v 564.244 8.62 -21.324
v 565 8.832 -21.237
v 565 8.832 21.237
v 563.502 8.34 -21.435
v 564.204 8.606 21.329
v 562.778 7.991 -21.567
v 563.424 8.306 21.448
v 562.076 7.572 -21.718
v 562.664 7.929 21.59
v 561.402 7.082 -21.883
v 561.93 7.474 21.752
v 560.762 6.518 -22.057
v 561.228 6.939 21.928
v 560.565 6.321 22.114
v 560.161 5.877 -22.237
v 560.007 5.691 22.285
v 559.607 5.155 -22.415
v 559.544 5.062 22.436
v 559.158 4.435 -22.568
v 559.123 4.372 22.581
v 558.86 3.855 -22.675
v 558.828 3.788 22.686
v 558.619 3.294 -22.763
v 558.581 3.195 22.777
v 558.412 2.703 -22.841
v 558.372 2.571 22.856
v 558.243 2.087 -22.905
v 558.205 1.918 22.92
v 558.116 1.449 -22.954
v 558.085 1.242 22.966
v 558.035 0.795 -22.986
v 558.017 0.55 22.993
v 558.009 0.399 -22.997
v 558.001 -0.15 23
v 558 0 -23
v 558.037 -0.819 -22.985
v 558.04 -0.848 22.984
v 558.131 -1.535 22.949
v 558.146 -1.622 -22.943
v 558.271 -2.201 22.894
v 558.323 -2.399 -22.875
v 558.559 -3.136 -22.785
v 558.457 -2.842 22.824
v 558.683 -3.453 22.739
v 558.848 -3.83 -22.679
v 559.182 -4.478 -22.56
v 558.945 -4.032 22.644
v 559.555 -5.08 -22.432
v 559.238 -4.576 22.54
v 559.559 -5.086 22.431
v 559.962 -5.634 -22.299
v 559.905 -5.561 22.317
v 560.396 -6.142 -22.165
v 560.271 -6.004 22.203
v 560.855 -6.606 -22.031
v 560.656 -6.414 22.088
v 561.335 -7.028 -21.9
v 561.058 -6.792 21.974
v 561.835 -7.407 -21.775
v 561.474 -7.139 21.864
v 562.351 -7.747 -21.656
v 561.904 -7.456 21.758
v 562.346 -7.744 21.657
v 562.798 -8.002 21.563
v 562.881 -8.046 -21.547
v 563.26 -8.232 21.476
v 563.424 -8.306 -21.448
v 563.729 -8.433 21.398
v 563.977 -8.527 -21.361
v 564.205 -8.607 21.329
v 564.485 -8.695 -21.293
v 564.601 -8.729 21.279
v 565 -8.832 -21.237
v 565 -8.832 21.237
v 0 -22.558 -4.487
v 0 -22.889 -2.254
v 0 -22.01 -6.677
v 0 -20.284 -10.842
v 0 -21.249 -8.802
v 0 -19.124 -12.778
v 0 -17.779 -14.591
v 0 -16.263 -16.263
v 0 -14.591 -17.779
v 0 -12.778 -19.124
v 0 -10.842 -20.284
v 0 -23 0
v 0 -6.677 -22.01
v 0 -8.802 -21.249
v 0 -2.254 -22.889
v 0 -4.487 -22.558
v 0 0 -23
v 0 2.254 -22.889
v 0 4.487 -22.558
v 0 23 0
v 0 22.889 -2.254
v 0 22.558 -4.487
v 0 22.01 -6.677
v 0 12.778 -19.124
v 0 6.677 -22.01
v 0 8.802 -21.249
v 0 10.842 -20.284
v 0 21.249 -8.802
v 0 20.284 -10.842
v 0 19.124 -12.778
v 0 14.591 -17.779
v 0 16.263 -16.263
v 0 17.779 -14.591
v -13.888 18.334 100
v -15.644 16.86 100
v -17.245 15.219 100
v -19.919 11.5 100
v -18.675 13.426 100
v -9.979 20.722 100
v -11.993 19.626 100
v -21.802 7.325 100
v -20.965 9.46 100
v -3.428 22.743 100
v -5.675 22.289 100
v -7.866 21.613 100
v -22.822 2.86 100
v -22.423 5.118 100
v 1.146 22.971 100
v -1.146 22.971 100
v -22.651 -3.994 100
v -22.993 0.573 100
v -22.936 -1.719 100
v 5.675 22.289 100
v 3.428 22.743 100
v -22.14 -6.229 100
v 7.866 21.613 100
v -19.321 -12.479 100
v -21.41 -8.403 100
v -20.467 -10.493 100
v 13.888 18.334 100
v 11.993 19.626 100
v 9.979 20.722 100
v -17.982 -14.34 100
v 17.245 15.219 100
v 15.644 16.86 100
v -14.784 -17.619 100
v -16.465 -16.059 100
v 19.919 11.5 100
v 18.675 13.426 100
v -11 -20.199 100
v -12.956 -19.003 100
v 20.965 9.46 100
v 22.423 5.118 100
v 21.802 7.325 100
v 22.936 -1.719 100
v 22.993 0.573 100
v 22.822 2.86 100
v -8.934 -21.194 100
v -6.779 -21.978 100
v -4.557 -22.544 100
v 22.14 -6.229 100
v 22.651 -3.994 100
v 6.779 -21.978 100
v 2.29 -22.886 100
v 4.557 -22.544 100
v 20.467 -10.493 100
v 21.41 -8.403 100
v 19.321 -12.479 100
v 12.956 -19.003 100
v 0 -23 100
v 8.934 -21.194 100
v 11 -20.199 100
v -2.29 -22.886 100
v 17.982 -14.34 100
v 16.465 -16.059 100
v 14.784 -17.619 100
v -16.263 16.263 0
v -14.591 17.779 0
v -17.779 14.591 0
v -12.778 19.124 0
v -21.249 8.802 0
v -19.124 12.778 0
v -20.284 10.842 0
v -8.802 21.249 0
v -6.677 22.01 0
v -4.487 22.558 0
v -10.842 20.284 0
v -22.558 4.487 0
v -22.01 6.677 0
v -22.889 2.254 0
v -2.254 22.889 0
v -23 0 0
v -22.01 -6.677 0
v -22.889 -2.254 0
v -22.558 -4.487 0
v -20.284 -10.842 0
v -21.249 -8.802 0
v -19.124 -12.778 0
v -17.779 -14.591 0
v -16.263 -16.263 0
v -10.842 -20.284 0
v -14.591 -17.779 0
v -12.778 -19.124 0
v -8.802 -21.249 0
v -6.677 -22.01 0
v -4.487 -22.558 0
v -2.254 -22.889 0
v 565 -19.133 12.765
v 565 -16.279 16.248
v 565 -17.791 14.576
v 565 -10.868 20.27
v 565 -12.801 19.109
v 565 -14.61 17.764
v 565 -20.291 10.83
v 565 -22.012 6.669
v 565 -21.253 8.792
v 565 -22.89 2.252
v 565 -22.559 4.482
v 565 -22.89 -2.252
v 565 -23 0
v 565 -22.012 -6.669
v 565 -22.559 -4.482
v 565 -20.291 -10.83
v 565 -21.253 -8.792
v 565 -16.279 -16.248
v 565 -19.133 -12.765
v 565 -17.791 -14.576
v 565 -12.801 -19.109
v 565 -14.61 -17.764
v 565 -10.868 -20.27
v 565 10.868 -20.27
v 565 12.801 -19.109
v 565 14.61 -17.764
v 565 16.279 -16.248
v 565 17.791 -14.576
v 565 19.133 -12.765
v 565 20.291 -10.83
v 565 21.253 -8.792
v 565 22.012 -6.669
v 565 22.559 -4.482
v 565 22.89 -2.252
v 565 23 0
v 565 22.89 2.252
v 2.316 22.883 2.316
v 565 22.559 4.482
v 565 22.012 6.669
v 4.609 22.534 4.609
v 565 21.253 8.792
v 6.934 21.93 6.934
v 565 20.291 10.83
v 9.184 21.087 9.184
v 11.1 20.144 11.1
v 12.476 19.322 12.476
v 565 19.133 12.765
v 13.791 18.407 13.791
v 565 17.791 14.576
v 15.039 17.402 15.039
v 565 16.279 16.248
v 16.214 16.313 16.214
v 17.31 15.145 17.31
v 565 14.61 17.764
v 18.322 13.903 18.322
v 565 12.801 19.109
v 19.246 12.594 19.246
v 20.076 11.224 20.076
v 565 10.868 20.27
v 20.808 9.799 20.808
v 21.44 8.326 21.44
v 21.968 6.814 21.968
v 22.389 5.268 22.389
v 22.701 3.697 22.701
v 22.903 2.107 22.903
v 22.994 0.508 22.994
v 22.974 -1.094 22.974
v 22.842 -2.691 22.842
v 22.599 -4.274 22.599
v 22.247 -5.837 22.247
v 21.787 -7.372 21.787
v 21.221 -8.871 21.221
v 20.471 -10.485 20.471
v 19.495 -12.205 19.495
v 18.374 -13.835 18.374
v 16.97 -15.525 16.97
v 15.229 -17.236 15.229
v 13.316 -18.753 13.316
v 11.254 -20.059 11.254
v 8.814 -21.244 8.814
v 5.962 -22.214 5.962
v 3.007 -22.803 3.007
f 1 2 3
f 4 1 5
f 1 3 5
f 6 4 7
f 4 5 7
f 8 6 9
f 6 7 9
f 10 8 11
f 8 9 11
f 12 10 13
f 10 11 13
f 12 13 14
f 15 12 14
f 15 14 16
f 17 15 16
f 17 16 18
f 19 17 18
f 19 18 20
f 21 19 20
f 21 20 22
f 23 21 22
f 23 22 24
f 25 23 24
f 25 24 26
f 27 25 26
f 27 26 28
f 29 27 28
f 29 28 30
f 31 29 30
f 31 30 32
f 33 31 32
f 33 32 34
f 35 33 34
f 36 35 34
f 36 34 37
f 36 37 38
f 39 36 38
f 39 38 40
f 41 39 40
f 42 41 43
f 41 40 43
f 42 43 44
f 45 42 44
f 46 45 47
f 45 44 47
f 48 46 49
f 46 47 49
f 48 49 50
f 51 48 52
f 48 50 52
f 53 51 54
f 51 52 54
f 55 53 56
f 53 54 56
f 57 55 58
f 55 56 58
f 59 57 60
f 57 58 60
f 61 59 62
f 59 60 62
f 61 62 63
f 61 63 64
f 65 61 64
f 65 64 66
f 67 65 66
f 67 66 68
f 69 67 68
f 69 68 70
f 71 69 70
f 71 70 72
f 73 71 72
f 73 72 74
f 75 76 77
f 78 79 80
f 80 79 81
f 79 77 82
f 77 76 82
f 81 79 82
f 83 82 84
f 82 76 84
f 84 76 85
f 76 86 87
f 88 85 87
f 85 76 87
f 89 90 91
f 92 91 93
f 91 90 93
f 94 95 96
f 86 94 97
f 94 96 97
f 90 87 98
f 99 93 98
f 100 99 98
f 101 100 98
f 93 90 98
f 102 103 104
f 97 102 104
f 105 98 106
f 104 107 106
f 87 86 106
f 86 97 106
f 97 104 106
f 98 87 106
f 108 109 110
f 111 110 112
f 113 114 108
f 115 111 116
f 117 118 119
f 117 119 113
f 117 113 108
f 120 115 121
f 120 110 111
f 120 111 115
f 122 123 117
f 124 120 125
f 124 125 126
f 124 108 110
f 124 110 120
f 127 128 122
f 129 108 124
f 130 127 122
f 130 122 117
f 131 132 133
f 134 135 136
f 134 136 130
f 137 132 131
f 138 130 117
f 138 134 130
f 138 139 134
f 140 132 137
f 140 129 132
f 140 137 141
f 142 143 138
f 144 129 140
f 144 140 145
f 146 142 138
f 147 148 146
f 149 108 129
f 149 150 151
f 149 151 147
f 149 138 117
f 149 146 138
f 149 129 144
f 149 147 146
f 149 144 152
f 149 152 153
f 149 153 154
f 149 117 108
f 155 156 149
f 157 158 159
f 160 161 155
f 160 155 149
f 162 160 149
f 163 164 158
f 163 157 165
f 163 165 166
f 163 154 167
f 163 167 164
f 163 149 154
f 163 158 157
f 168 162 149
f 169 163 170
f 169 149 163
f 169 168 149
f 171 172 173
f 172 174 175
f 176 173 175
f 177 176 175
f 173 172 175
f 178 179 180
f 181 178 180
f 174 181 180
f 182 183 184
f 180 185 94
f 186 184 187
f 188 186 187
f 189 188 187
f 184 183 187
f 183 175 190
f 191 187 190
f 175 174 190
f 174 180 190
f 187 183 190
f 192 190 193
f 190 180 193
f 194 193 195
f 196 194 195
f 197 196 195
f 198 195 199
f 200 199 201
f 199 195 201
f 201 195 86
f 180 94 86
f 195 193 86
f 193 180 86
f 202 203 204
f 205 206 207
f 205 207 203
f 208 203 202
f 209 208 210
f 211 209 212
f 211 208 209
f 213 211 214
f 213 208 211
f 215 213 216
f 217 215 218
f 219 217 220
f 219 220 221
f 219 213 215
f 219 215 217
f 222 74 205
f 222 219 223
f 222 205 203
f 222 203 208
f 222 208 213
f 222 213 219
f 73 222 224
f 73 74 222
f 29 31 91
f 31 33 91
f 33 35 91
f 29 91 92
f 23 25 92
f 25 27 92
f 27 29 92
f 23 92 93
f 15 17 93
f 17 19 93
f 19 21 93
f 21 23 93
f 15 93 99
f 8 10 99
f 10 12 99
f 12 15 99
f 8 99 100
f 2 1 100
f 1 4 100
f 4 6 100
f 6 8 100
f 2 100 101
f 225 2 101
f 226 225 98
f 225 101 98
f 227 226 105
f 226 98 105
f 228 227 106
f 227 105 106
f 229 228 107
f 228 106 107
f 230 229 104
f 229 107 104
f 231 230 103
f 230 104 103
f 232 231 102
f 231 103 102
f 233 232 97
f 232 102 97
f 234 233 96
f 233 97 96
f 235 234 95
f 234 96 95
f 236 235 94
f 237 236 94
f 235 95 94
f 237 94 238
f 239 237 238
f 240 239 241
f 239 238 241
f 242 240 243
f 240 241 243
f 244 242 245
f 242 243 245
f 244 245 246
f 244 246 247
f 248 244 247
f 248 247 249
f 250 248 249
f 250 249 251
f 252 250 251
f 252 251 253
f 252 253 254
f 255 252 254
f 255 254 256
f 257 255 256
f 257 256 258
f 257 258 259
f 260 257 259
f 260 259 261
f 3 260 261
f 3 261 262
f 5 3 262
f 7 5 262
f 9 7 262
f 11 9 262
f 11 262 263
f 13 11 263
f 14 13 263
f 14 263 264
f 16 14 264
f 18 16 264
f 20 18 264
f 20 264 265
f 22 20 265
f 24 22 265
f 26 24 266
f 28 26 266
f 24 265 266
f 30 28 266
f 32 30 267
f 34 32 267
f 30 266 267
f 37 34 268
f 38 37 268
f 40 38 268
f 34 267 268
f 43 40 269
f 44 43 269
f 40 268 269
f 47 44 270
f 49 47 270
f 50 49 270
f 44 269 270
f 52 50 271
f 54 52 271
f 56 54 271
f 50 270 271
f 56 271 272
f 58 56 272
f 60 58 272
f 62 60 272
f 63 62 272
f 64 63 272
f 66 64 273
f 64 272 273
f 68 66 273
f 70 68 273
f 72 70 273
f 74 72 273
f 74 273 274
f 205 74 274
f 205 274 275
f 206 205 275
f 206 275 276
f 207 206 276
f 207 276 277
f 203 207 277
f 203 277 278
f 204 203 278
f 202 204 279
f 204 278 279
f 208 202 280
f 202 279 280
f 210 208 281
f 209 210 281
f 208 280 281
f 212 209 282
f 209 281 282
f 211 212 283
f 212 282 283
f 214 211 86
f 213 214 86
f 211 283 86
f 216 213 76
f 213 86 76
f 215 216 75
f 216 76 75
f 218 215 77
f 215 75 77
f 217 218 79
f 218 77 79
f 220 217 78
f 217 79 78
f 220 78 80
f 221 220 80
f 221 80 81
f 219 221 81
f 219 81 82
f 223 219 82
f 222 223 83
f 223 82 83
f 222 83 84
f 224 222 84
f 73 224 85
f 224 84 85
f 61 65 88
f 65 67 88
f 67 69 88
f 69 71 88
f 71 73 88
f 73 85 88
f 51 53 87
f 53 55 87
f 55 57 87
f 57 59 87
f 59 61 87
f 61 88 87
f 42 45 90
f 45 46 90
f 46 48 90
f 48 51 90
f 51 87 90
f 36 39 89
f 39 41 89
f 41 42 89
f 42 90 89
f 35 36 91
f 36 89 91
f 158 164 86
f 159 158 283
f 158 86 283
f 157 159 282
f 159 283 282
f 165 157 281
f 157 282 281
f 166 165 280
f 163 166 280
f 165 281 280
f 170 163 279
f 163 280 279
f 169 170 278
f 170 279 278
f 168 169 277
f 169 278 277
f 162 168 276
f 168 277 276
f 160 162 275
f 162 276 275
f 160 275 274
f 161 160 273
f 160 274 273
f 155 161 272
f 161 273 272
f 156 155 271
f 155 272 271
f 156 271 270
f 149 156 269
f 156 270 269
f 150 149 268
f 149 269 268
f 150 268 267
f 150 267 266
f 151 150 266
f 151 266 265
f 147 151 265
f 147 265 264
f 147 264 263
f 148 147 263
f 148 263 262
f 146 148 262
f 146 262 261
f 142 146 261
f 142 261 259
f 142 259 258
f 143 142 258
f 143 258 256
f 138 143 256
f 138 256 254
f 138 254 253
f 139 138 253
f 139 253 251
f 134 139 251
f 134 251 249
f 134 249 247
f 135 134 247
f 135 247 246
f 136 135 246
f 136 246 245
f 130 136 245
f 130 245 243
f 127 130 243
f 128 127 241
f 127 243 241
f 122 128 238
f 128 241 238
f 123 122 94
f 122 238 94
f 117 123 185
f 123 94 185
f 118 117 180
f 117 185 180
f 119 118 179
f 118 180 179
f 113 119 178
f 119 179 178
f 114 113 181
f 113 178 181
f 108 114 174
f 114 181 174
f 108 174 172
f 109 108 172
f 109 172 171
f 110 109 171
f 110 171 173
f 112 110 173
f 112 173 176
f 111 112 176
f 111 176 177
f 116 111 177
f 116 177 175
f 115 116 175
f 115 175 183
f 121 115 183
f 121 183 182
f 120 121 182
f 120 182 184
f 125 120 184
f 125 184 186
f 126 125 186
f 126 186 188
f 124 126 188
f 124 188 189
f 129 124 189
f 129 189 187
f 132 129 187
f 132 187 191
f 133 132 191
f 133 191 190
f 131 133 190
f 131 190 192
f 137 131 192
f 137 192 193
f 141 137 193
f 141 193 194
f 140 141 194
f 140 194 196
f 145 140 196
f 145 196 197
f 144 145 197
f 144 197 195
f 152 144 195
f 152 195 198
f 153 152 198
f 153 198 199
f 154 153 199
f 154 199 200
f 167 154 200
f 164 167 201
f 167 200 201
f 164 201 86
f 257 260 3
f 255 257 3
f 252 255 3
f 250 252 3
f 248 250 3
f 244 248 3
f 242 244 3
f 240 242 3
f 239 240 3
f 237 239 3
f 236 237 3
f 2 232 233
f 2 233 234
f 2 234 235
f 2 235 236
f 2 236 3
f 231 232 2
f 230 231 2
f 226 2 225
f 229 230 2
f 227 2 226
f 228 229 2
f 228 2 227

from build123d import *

# Parameters (mm, degrees)
SKETCH1_R                         = 23
LENGTH_DEPTH                      = 565
SKETCH2_R                         = 23
HIP_JOINT_DEPTH                   = 100
TIBIA_AXIS_REACH                  = 576.242
TIBIA_AXIS_END_RADIUS             = 23
SKETCH3_R                         = 9.071418029
TIBIA_AXIS_DIRECTION_2_REACH      = 576.242
TIBIA_AXIS_DIRECTION_2_END_RADIUS = 23


with BuildPart() as part:
    # Sketch1 → Length (new body)
    with BuildSketch(Plane(origin=(0, 0, 0), x_dir=(0, 0, -1), z_dir=(1, 0, 0))):
        Circle(SKETCH1_R)
    extrude(amount=LENGTH_DEPTH)

    # Sketch2 → Hip joint (add)
    with BuildSketch(Plane.XY):
        with Locations(Location((0, 0, 0), (0, 0, 270))):
            Circle(SKETCH2_R)
    extrude(amount=HIP_JOINT_DEPTH)

    # Tibia axis: up to this cylinder (the profile starts inside it)
    tibia_axis_end = Plane(origin=(567.07131, 0, 0), z_dir=(-1, 0, 0)) * Cylinder(TIBIA_AXIS_END_RADIUS, 1199.484, mode=Mode.PRIVATE)
    # Sketch3 → Tibia axis (cut, up to the surface)
    with BuildSketch(Plane.XY, mode=Mode.PRIVATE) as tibia_axis_sk1:
        with Locations((567.071310444, 0)):
            Circle(SKETCH3_R)
    tibia_axis_tool1 = extrude(tibia_axis_sk1.sketch, amount=-TIBIA_AXIS_REACH, mode=Mode.PRIVATE) & tibia_axis_end
    add(tibia_axis_tool1.solids().sort_by_distance((567.07131, 0, 0))[0], mode=Mode.SUBTRACT)

    # Tibia axis direction 2: up to this cylinder (the profile starts inside it)
    tibia_axis_direction_2_end = Plane(origin=(567.07131, 0, 0), z_dir=(-1, 0, 0)) * Cylinder(TIBIA_AXIS_DIRECTION_2_END_RADIUS, 1199.484, mode=Mode.PRIVATE)
    # Sketch3 → Tibia axis direction 2 (cut, up to the surface)
    with BuildSketch(Plane.XY, mode=Mode.PRIVATE) as tibia_axis_direction_2_sk1:
        with Locations((567.071310444, 0)):
            Circle(SKETCH3_R)
    tibia_axis_direction_2_tool1 = extrude(tibia_axis_direction_2_sk1.sketch, amount=TIBIA_AXIS_DIRECTION_2_REACH, mode=Mode.PRIVATE) & tibia_axis_direction_2_end
    add(tibia_axis_direction_2_tool1.solids().sort_by_distance((567.07131, 0, 0))[0], mode=Mode.SUBTRACT)


solid = part.part
